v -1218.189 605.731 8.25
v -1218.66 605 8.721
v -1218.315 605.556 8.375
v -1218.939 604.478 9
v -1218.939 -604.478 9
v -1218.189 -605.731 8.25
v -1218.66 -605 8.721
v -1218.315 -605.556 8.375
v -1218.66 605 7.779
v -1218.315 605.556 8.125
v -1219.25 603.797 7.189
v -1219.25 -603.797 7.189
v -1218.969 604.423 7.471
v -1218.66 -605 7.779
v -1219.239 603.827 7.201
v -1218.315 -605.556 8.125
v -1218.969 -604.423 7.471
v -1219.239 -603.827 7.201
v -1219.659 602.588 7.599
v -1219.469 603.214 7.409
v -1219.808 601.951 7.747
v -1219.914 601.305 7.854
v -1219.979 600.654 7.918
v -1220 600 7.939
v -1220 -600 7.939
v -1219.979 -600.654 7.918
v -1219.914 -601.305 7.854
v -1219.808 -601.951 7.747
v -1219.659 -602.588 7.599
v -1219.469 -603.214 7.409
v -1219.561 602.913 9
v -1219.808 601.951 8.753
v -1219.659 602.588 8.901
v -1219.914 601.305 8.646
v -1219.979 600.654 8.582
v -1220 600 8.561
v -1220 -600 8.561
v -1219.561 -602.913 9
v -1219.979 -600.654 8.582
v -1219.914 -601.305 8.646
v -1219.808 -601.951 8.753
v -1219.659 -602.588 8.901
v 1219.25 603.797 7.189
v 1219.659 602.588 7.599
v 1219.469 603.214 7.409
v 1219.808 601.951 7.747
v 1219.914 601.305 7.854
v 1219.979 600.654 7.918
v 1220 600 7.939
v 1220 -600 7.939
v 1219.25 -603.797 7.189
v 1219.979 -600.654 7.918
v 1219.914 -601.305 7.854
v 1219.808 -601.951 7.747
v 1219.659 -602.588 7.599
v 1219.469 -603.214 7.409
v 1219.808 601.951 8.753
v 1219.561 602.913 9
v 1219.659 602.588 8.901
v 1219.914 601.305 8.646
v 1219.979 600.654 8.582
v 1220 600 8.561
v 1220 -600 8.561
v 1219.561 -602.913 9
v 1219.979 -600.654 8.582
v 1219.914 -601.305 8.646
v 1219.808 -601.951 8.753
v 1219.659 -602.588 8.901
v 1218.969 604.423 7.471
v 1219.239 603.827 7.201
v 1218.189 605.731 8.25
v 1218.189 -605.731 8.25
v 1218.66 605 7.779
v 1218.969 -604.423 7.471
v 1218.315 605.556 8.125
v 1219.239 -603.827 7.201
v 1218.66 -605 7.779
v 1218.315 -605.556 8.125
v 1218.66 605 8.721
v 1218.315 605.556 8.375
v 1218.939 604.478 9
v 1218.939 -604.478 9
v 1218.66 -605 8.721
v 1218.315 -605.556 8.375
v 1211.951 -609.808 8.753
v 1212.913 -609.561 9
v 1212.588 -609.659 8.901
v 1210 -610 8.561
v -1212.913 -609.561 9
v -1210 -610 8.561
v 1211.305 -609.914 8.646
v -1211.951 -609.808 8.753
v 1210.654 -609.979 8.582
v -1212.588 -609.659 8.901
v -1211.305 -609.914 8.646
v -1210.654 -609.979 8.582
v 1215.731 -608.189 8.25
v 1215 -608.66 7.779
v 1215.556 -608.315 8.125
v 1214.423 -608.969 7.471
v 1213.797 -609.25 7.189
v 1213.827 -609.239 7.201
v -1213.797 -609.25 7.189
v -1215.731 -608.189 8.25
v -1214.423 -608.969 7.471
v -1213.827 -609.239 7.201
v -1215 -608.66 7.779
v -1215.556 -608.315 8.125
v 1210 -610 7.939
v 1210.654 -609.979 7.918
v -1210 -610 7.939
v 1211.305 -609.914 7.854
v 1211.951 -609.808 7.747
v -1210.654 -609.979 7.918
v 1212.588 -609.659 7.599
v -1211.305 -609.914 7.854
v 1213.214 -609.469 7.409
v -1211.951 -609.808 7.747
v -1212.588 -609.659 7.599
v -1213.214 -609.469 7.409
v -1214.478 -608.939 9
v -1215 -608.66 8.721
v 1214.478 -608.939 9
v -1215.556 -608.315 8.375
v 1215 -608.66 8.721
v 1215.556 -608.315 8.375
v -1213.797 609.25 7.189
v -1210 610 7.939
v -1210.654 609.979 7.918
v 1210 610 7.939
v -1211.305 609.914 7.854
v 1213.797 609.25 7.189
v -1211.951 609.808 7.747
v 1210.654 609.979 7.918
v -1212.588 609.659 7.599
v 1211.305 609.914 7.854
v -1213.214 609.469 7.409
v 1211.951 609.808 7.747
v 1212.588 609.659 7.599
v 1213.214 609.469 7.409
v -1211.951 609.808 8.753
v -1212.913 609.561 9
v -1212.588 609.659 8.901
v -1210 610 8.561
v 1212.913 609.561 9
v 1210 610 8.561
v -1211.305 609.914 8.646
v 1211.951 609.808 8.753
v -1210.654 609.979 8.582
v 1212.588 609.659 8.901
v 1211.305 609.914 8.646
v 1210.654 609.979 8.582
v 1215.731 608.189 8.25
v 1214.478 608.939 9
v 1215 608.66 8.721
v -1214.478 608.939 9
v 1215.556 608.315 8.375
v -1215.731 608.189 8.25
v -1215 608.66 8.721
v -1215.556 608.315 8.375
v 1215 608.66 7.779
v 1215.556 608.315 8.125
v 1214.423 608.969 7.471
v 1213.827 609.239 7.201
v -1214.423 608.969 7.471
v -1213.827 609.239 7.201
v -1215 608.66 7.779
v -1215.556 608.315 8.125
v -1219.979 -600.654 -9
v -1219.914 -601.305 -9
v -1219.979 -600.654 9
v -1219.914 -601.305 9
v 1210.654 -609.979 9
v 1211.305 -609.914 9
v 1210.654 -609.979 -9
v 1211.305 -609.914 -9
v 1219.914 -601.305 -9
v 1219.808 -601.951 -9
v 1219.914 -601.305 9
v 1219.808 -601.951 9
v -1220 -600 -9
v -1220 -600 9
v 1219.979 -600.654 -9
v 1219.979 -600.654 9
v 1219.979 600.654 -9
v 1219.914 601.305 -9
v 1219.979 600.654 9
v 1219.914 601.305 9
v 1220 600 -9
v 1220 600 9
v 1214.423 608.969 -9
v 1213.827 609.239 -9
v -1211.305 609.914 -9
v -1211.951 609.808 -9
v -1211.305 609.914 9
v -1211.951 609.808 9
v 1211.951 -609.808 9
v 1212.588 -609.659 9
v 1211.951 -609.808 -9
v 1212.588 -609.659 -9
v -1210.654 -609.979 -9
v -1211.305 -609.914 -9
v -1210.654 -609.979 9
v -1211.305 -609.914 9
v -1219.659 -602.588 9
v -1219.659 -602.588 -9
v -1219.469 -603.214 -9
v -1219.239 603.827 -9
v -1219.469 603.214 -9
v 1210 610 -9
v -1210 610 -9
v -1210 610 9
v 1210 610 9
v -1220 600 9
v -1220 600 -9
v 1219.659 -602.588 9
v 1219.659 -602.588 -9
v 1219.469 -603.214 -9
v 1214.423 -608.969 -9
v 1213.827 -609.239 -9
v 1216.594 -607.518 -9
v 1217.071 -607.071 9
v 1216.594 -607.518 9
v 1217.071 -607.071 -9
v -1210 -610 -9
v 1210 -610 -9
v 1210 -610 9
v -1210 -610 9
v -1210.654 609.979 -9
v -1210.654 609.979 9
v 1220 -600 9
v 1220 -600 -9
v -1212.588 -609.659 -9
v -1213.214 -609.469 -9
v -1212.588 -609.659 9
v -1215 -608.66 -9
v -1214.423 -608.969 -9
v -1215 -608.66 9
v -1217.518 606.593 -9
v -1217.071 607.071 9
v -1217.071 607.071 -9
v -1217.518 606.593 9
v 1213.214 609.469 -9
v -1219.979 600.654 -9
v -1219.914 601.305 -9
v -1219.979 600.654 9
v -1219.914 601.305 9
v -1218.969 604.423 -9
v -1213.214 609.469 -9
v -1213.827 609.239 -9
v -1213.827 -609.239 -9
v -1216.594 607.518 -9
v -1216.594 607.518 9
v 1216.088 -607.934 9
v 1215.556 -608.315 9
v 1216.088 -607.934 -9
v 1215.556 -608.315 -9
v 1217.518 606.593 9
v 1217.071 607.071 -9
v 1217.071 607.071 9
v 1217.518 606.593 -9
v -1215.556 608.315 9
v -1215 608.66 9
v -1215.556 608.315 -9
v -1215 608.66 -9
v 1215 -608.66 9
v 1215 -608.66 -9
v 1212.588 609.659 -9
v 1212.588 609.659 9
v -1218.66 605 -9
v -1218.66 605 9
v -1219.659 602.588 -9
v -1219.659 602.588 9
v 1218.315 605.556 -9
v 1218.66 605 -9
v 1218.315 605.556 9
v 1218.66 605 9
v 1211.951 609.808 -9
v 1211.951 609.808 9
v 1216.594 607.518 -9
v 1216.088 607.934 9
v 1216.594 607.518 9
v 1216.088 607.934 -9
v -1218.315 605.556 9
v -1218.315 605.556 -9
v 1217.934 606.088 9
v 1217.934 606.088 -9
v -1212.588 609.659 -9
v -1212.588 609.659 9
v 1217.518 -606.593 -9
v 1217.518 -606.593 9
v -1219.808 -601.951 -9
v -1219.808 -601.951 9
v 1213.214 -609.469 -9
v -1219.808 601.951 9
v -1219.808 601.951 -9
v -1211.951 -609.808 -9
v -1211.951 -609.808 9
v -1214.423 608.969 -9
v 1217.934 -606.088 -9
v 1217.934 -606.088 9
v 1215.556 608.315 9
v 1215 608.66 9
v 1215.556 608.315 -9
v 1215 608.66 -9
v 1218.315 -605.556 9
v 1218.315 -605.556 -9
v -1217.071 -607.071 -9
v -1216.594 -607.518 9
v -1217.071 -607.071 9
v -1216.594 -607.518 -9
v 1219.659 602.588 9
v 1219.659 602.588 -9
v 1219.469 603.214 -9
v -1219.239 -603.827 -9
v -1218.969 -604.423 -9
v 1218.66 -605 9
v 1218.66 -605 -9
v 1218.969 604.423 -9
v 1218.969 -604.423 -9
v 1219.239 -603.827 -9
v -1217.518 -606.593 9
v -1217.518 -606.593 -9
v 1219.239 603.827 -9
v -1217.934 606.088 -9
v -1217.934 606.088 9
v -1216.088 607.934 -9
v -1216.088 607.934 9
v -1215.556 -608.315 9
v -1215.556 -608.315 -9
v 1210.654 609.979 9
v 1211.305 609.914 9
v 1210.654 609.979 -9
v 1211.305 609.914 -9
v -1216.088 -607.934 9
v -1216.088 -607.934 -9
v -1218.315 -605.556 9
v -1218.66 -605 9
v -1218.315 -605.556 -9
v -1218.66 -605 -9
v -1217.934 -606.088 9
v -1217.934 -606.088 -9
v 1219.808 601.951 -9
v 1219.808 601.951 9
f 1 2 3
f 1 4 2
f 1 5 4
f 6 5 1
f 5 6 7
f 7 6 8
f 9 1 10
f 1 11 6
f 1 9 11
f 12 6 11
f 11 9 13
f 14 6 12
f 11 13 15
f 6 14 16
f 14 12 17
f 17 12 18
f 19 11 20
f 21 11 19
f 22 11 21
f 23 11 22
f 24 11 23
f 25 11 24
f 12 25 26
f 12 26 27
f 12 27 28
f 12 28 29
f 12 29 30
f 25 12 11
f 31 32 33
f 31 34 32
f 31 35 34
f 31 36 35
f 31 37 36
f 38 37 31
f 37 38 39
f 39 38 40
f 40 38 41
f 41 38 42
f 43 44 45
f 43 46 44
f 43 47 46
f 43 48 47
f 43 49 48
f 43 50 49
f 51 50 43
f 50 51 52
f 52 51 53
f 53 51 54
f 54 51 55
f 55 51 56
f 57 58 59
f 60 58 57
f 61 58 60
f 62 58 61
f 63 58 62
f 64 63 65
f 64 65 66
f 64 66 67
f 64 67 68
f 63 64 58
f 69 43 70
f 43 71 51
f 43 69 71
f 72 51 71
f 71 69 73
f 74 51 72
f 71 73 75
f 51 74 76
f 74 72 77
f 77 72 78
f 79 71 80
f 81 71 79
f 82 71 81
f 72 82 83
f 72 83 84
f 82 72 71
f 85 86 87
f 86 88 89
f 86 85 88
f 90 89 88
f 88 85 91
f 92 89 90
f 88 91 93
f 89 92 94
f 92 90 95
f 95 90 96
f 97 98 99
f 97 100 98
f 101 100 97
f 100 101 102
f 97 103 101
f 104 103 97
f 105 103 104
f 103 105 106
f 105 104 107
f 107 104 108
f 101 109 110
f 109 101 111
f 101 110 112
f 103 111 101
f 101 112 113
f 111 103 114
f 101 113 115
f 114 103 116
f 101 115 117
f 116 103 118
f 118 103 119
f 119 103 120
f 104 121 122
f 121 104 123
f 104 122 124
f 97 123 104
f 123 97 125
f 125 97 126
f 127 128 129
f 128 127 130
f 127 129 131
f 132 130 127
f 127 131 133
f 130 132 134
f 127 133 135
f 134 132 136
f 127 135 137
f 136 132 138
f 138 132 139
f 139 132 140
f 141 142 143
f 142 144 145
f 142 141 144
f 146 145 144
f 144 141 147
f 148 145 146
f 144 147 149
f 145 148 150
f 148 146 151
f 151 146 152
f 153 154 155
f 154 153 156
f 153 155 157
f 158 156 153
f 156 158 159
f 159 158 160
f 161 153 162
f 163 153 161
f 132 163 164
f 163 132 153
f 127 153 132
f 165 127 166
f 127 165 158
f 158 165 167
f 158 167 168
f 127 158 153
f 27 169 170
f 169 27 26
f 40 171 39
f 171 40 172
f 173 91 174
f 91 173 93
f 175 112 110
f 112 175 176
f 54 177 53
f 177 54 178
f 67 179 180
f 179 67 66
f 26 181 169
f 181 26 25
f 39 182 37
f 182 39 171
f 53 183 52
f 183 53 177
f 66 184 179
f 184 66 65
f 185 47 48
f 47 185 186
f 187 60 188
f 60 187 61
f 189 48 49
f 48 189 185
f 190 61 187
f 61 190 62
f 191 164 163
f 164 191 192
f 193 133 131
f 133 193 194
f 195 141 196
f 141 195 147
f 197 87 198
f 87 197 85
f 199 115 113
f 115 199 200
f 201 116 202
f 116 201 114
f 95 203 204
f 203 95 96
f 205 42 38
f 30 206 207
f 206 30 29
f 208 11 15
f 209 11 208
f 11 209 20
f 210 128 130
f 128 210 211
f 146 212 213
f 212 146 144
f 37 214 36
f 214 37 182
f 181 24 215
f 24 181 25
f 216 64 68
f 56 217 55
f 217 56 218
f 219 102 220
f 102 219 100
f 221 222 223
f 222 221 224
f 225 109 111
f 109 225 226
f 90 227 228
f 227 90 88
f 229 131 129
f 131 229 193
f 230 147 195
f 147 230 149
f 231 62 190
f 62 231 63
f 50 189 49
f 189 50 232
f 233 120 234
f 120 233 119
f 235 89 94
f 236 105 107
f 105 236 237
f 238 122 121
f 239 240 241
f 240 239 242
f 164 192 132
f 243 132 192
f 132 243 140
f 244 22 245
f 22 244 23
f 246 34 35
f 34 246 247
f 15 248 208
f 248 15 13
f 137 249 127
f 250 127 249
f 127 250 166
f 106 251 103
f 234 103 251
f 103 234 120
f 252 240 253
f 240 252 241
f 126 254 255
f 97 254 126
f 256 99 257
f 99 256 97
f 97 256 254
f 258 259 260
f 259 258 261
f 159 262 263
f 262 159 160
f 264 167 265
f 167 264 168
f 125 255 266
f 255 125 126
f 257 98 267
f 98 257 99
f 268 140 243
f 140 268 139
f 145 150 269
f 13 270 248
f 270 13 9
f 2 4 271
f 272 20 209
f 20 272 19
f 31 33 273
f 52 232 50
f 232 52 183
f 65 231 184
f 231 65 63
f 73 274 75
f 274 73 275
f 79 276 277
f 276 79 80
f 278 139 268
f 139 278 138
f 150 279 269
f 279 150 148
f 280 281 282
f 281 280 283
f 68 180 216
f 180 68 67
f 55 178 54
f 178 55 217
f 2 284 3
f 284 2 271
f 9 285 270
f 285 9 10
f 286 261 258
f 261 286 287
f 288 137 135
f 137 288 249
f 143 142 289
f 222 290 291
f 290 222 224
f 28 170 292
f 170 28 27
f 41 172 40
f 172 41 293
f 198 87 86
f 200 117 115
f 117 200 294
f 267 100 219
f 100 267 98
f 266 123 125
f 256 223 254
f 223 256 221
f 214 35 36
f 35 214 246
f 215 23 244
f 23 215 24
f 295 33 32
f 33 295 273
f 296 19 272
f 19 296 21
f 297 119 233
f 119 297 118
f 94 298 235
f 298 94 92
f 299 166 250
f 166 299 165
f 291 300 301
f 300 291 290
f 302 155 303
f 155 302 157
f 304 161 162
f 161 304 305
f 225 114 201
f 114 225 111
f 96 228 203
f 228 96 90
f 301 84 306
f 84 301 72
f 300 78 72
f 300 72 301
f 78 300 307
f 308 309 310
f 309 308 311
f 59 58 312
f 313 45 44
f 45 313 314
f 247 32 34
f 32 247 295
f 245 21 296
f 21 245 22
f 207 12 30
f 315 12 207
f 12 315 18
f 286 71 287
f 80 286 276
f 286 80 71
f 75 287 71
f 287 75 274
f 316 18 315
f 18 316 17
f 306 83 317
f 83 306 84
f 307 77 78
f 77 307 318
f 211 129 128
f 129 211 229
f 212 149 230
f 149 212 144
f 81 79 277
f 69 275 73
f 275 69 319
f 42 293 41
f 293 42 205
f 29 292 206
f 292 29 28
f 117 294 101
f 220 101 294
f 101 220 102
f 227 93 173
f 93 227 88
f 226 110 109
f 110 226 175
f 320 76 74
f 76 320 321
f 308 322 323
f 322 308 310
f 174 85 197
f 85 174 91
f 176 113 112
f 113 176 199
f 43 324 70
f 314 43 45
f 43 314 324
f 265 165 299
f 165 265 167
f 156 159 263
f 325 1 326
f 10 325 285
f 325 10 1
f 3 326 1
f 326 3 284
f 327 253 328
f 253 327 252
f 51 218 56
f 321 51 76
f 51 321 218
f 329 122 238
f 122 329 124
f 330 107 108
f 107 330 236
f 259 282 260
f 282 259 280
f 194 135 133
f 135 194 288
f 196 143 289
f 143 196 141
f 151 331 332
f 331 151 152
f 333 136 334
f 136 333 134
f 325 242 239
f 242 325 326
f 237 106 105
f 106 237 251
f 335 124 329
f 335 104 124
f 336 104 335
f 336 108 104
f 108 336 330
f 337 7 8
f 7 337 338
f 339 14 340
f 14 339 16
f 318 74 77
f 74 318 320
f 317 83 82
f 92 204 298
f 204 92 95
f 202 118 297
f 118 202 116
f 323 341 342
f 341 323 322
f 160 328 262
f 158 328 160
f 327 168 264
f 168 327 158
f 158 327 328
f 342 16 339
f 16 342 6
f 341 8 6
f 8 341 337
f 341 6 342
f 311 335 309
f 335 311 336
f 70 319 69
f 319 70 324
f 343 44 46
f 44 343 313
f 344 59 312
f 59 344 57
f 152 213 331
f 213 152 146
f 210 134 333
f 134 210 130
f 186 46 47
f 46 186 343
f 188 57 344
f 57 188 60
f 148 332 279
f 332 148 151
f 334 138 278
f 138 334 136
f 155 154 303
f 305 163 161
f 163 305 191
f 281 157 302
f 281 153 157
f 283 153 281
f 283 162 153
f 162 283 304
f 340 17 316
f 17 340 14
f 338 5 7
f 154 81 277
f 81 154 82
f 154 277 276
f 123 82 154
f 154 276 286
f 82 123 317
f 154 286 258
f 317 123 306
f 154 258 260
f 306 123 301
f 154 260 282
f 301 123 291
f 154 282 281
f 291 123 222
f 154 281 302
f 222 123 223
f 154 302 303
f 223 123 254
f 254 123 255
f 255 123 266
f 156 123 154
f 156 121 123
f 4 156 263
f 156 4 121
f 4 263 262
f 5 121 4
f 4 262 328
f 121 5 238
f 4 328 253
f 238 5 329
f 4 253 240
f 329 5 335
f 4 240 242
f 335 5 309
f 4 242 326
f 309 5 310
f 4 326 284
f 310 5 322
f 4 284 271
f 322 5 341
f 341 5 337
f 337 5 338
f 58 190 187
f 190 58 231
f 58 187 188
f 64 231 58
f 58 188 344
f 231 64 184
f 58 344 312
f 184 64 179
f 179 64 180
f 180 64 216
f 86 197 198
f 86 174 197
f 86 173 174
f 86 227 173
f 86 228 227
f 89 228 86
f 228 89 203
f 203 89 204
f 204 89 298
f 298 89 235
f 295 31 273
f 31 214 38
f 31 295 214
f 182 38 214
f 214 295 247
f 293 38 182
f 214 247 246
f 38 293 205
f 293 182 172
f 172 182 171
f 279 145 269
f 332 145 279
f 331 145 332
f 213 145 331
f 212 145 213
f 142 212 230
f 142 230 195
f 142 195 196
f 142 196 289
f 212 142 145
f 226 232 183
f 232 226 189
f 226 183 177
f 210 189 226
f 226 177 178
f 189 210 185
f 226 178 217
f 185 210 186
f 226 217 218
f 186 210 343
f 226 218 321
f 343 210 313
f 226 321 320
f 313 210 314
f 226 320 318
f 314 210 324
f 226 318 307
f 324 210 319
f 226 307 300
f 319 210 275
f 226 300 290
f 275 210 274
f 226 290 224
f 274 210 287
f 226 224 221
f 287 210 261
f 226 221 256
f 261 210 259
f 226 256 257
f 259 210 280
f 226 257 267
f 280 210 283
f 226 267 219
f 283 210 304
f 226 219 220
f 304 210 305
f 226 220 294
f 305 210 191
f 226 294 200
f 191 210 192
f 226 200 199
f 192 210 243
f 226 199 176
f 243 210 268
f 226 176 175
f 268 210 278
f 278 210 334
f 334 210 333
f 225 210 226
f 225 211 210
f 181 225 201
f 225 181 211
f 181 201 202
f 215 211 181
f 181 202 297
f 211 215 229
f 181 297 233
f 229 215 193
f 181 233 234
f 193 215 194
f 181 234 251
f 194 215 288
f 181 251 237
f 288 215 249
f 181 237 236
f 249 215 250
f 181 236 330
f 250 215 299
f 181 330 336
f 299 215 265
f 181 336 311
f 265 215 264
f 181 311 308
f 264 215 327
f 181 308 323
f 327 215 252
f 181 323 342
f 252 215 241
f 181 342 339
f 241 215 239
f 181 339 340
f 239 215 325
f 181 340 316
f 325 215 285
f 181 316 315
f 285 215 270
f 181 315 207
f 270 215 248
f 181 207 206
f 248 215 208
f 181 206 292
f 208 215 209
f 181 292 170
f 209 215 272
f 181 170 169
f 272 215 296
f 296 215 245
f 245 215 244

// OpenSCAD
// Sheet MDF (single connected solid with rounded corners + top-edge chamfer)

sheet_L   = 2440; //[1220:4880:1]
sheet_W   = 1220; //[610:2440:1]
sheet_T   = 18;   //[9:36:1]
corner_R  = 10;   //[2:40:1]
chamfer_C = 1.5;  //[0.5:5:0.5]
overlap   = 1;    //[0.5:2:0.5]

$fn = 96;

// 2D rounded rectangle profile
module rounded_rect_2d(L, W, R) {
  R2 = min(R, min(L, W)/2);
  hull() {
    for (sx = [-1, 1], sy = [-1, 1])
      translate([sx*(L/2 - R2), sy*(W/2 - R2)])
        circle(r=R2);
  }
}

// Main solid: rounded corners via linear_extrude
module rounded_sheet() {
  linear_extrude(height=sheet_T, center=true, convexity=10)
    rounded_rect_2d(sheet_L, sheet_W, corner_R);
}

// Chamfer cutters (remove material from the TOP edges only)
// Use long cutters that fully intersect the sheet to avoid blank/degenerate renders.
module chamfer_cutters() {
  cutter_len = max(sheet_L, sheet_W) + 4*overlap;

  // Cut along the two X edges (x = +/- L/2)
  for (sx = [-1, 1]) {
    translate([sx*(sheet_L/2 - chamfer_C/2), 0, sheet_T/2 - chamfer_C/2])
      rotate([0, 45, 0])  // bevel in X-Z plane
        cube([chamfer_C, cutter_len, chamfer_C], center=true);
  }

  // Cut along the two Y edges (y = +/- W/2)
  for (sy = [-1, 1]) {
    translate([0, sy*(sheet_W/2 - chamfer_C/2), sheet_T/2 - chamfer_C/2])
      rotate([45, 0, 0])  // bevel in Y-Z plane
        cube([cutter_len, chamfer_C, chamfer_C], center=true);
  }
}

// Final output (one connected solid)
difference() {
  rounded_sheet();
  chamfer_cutters();
}
